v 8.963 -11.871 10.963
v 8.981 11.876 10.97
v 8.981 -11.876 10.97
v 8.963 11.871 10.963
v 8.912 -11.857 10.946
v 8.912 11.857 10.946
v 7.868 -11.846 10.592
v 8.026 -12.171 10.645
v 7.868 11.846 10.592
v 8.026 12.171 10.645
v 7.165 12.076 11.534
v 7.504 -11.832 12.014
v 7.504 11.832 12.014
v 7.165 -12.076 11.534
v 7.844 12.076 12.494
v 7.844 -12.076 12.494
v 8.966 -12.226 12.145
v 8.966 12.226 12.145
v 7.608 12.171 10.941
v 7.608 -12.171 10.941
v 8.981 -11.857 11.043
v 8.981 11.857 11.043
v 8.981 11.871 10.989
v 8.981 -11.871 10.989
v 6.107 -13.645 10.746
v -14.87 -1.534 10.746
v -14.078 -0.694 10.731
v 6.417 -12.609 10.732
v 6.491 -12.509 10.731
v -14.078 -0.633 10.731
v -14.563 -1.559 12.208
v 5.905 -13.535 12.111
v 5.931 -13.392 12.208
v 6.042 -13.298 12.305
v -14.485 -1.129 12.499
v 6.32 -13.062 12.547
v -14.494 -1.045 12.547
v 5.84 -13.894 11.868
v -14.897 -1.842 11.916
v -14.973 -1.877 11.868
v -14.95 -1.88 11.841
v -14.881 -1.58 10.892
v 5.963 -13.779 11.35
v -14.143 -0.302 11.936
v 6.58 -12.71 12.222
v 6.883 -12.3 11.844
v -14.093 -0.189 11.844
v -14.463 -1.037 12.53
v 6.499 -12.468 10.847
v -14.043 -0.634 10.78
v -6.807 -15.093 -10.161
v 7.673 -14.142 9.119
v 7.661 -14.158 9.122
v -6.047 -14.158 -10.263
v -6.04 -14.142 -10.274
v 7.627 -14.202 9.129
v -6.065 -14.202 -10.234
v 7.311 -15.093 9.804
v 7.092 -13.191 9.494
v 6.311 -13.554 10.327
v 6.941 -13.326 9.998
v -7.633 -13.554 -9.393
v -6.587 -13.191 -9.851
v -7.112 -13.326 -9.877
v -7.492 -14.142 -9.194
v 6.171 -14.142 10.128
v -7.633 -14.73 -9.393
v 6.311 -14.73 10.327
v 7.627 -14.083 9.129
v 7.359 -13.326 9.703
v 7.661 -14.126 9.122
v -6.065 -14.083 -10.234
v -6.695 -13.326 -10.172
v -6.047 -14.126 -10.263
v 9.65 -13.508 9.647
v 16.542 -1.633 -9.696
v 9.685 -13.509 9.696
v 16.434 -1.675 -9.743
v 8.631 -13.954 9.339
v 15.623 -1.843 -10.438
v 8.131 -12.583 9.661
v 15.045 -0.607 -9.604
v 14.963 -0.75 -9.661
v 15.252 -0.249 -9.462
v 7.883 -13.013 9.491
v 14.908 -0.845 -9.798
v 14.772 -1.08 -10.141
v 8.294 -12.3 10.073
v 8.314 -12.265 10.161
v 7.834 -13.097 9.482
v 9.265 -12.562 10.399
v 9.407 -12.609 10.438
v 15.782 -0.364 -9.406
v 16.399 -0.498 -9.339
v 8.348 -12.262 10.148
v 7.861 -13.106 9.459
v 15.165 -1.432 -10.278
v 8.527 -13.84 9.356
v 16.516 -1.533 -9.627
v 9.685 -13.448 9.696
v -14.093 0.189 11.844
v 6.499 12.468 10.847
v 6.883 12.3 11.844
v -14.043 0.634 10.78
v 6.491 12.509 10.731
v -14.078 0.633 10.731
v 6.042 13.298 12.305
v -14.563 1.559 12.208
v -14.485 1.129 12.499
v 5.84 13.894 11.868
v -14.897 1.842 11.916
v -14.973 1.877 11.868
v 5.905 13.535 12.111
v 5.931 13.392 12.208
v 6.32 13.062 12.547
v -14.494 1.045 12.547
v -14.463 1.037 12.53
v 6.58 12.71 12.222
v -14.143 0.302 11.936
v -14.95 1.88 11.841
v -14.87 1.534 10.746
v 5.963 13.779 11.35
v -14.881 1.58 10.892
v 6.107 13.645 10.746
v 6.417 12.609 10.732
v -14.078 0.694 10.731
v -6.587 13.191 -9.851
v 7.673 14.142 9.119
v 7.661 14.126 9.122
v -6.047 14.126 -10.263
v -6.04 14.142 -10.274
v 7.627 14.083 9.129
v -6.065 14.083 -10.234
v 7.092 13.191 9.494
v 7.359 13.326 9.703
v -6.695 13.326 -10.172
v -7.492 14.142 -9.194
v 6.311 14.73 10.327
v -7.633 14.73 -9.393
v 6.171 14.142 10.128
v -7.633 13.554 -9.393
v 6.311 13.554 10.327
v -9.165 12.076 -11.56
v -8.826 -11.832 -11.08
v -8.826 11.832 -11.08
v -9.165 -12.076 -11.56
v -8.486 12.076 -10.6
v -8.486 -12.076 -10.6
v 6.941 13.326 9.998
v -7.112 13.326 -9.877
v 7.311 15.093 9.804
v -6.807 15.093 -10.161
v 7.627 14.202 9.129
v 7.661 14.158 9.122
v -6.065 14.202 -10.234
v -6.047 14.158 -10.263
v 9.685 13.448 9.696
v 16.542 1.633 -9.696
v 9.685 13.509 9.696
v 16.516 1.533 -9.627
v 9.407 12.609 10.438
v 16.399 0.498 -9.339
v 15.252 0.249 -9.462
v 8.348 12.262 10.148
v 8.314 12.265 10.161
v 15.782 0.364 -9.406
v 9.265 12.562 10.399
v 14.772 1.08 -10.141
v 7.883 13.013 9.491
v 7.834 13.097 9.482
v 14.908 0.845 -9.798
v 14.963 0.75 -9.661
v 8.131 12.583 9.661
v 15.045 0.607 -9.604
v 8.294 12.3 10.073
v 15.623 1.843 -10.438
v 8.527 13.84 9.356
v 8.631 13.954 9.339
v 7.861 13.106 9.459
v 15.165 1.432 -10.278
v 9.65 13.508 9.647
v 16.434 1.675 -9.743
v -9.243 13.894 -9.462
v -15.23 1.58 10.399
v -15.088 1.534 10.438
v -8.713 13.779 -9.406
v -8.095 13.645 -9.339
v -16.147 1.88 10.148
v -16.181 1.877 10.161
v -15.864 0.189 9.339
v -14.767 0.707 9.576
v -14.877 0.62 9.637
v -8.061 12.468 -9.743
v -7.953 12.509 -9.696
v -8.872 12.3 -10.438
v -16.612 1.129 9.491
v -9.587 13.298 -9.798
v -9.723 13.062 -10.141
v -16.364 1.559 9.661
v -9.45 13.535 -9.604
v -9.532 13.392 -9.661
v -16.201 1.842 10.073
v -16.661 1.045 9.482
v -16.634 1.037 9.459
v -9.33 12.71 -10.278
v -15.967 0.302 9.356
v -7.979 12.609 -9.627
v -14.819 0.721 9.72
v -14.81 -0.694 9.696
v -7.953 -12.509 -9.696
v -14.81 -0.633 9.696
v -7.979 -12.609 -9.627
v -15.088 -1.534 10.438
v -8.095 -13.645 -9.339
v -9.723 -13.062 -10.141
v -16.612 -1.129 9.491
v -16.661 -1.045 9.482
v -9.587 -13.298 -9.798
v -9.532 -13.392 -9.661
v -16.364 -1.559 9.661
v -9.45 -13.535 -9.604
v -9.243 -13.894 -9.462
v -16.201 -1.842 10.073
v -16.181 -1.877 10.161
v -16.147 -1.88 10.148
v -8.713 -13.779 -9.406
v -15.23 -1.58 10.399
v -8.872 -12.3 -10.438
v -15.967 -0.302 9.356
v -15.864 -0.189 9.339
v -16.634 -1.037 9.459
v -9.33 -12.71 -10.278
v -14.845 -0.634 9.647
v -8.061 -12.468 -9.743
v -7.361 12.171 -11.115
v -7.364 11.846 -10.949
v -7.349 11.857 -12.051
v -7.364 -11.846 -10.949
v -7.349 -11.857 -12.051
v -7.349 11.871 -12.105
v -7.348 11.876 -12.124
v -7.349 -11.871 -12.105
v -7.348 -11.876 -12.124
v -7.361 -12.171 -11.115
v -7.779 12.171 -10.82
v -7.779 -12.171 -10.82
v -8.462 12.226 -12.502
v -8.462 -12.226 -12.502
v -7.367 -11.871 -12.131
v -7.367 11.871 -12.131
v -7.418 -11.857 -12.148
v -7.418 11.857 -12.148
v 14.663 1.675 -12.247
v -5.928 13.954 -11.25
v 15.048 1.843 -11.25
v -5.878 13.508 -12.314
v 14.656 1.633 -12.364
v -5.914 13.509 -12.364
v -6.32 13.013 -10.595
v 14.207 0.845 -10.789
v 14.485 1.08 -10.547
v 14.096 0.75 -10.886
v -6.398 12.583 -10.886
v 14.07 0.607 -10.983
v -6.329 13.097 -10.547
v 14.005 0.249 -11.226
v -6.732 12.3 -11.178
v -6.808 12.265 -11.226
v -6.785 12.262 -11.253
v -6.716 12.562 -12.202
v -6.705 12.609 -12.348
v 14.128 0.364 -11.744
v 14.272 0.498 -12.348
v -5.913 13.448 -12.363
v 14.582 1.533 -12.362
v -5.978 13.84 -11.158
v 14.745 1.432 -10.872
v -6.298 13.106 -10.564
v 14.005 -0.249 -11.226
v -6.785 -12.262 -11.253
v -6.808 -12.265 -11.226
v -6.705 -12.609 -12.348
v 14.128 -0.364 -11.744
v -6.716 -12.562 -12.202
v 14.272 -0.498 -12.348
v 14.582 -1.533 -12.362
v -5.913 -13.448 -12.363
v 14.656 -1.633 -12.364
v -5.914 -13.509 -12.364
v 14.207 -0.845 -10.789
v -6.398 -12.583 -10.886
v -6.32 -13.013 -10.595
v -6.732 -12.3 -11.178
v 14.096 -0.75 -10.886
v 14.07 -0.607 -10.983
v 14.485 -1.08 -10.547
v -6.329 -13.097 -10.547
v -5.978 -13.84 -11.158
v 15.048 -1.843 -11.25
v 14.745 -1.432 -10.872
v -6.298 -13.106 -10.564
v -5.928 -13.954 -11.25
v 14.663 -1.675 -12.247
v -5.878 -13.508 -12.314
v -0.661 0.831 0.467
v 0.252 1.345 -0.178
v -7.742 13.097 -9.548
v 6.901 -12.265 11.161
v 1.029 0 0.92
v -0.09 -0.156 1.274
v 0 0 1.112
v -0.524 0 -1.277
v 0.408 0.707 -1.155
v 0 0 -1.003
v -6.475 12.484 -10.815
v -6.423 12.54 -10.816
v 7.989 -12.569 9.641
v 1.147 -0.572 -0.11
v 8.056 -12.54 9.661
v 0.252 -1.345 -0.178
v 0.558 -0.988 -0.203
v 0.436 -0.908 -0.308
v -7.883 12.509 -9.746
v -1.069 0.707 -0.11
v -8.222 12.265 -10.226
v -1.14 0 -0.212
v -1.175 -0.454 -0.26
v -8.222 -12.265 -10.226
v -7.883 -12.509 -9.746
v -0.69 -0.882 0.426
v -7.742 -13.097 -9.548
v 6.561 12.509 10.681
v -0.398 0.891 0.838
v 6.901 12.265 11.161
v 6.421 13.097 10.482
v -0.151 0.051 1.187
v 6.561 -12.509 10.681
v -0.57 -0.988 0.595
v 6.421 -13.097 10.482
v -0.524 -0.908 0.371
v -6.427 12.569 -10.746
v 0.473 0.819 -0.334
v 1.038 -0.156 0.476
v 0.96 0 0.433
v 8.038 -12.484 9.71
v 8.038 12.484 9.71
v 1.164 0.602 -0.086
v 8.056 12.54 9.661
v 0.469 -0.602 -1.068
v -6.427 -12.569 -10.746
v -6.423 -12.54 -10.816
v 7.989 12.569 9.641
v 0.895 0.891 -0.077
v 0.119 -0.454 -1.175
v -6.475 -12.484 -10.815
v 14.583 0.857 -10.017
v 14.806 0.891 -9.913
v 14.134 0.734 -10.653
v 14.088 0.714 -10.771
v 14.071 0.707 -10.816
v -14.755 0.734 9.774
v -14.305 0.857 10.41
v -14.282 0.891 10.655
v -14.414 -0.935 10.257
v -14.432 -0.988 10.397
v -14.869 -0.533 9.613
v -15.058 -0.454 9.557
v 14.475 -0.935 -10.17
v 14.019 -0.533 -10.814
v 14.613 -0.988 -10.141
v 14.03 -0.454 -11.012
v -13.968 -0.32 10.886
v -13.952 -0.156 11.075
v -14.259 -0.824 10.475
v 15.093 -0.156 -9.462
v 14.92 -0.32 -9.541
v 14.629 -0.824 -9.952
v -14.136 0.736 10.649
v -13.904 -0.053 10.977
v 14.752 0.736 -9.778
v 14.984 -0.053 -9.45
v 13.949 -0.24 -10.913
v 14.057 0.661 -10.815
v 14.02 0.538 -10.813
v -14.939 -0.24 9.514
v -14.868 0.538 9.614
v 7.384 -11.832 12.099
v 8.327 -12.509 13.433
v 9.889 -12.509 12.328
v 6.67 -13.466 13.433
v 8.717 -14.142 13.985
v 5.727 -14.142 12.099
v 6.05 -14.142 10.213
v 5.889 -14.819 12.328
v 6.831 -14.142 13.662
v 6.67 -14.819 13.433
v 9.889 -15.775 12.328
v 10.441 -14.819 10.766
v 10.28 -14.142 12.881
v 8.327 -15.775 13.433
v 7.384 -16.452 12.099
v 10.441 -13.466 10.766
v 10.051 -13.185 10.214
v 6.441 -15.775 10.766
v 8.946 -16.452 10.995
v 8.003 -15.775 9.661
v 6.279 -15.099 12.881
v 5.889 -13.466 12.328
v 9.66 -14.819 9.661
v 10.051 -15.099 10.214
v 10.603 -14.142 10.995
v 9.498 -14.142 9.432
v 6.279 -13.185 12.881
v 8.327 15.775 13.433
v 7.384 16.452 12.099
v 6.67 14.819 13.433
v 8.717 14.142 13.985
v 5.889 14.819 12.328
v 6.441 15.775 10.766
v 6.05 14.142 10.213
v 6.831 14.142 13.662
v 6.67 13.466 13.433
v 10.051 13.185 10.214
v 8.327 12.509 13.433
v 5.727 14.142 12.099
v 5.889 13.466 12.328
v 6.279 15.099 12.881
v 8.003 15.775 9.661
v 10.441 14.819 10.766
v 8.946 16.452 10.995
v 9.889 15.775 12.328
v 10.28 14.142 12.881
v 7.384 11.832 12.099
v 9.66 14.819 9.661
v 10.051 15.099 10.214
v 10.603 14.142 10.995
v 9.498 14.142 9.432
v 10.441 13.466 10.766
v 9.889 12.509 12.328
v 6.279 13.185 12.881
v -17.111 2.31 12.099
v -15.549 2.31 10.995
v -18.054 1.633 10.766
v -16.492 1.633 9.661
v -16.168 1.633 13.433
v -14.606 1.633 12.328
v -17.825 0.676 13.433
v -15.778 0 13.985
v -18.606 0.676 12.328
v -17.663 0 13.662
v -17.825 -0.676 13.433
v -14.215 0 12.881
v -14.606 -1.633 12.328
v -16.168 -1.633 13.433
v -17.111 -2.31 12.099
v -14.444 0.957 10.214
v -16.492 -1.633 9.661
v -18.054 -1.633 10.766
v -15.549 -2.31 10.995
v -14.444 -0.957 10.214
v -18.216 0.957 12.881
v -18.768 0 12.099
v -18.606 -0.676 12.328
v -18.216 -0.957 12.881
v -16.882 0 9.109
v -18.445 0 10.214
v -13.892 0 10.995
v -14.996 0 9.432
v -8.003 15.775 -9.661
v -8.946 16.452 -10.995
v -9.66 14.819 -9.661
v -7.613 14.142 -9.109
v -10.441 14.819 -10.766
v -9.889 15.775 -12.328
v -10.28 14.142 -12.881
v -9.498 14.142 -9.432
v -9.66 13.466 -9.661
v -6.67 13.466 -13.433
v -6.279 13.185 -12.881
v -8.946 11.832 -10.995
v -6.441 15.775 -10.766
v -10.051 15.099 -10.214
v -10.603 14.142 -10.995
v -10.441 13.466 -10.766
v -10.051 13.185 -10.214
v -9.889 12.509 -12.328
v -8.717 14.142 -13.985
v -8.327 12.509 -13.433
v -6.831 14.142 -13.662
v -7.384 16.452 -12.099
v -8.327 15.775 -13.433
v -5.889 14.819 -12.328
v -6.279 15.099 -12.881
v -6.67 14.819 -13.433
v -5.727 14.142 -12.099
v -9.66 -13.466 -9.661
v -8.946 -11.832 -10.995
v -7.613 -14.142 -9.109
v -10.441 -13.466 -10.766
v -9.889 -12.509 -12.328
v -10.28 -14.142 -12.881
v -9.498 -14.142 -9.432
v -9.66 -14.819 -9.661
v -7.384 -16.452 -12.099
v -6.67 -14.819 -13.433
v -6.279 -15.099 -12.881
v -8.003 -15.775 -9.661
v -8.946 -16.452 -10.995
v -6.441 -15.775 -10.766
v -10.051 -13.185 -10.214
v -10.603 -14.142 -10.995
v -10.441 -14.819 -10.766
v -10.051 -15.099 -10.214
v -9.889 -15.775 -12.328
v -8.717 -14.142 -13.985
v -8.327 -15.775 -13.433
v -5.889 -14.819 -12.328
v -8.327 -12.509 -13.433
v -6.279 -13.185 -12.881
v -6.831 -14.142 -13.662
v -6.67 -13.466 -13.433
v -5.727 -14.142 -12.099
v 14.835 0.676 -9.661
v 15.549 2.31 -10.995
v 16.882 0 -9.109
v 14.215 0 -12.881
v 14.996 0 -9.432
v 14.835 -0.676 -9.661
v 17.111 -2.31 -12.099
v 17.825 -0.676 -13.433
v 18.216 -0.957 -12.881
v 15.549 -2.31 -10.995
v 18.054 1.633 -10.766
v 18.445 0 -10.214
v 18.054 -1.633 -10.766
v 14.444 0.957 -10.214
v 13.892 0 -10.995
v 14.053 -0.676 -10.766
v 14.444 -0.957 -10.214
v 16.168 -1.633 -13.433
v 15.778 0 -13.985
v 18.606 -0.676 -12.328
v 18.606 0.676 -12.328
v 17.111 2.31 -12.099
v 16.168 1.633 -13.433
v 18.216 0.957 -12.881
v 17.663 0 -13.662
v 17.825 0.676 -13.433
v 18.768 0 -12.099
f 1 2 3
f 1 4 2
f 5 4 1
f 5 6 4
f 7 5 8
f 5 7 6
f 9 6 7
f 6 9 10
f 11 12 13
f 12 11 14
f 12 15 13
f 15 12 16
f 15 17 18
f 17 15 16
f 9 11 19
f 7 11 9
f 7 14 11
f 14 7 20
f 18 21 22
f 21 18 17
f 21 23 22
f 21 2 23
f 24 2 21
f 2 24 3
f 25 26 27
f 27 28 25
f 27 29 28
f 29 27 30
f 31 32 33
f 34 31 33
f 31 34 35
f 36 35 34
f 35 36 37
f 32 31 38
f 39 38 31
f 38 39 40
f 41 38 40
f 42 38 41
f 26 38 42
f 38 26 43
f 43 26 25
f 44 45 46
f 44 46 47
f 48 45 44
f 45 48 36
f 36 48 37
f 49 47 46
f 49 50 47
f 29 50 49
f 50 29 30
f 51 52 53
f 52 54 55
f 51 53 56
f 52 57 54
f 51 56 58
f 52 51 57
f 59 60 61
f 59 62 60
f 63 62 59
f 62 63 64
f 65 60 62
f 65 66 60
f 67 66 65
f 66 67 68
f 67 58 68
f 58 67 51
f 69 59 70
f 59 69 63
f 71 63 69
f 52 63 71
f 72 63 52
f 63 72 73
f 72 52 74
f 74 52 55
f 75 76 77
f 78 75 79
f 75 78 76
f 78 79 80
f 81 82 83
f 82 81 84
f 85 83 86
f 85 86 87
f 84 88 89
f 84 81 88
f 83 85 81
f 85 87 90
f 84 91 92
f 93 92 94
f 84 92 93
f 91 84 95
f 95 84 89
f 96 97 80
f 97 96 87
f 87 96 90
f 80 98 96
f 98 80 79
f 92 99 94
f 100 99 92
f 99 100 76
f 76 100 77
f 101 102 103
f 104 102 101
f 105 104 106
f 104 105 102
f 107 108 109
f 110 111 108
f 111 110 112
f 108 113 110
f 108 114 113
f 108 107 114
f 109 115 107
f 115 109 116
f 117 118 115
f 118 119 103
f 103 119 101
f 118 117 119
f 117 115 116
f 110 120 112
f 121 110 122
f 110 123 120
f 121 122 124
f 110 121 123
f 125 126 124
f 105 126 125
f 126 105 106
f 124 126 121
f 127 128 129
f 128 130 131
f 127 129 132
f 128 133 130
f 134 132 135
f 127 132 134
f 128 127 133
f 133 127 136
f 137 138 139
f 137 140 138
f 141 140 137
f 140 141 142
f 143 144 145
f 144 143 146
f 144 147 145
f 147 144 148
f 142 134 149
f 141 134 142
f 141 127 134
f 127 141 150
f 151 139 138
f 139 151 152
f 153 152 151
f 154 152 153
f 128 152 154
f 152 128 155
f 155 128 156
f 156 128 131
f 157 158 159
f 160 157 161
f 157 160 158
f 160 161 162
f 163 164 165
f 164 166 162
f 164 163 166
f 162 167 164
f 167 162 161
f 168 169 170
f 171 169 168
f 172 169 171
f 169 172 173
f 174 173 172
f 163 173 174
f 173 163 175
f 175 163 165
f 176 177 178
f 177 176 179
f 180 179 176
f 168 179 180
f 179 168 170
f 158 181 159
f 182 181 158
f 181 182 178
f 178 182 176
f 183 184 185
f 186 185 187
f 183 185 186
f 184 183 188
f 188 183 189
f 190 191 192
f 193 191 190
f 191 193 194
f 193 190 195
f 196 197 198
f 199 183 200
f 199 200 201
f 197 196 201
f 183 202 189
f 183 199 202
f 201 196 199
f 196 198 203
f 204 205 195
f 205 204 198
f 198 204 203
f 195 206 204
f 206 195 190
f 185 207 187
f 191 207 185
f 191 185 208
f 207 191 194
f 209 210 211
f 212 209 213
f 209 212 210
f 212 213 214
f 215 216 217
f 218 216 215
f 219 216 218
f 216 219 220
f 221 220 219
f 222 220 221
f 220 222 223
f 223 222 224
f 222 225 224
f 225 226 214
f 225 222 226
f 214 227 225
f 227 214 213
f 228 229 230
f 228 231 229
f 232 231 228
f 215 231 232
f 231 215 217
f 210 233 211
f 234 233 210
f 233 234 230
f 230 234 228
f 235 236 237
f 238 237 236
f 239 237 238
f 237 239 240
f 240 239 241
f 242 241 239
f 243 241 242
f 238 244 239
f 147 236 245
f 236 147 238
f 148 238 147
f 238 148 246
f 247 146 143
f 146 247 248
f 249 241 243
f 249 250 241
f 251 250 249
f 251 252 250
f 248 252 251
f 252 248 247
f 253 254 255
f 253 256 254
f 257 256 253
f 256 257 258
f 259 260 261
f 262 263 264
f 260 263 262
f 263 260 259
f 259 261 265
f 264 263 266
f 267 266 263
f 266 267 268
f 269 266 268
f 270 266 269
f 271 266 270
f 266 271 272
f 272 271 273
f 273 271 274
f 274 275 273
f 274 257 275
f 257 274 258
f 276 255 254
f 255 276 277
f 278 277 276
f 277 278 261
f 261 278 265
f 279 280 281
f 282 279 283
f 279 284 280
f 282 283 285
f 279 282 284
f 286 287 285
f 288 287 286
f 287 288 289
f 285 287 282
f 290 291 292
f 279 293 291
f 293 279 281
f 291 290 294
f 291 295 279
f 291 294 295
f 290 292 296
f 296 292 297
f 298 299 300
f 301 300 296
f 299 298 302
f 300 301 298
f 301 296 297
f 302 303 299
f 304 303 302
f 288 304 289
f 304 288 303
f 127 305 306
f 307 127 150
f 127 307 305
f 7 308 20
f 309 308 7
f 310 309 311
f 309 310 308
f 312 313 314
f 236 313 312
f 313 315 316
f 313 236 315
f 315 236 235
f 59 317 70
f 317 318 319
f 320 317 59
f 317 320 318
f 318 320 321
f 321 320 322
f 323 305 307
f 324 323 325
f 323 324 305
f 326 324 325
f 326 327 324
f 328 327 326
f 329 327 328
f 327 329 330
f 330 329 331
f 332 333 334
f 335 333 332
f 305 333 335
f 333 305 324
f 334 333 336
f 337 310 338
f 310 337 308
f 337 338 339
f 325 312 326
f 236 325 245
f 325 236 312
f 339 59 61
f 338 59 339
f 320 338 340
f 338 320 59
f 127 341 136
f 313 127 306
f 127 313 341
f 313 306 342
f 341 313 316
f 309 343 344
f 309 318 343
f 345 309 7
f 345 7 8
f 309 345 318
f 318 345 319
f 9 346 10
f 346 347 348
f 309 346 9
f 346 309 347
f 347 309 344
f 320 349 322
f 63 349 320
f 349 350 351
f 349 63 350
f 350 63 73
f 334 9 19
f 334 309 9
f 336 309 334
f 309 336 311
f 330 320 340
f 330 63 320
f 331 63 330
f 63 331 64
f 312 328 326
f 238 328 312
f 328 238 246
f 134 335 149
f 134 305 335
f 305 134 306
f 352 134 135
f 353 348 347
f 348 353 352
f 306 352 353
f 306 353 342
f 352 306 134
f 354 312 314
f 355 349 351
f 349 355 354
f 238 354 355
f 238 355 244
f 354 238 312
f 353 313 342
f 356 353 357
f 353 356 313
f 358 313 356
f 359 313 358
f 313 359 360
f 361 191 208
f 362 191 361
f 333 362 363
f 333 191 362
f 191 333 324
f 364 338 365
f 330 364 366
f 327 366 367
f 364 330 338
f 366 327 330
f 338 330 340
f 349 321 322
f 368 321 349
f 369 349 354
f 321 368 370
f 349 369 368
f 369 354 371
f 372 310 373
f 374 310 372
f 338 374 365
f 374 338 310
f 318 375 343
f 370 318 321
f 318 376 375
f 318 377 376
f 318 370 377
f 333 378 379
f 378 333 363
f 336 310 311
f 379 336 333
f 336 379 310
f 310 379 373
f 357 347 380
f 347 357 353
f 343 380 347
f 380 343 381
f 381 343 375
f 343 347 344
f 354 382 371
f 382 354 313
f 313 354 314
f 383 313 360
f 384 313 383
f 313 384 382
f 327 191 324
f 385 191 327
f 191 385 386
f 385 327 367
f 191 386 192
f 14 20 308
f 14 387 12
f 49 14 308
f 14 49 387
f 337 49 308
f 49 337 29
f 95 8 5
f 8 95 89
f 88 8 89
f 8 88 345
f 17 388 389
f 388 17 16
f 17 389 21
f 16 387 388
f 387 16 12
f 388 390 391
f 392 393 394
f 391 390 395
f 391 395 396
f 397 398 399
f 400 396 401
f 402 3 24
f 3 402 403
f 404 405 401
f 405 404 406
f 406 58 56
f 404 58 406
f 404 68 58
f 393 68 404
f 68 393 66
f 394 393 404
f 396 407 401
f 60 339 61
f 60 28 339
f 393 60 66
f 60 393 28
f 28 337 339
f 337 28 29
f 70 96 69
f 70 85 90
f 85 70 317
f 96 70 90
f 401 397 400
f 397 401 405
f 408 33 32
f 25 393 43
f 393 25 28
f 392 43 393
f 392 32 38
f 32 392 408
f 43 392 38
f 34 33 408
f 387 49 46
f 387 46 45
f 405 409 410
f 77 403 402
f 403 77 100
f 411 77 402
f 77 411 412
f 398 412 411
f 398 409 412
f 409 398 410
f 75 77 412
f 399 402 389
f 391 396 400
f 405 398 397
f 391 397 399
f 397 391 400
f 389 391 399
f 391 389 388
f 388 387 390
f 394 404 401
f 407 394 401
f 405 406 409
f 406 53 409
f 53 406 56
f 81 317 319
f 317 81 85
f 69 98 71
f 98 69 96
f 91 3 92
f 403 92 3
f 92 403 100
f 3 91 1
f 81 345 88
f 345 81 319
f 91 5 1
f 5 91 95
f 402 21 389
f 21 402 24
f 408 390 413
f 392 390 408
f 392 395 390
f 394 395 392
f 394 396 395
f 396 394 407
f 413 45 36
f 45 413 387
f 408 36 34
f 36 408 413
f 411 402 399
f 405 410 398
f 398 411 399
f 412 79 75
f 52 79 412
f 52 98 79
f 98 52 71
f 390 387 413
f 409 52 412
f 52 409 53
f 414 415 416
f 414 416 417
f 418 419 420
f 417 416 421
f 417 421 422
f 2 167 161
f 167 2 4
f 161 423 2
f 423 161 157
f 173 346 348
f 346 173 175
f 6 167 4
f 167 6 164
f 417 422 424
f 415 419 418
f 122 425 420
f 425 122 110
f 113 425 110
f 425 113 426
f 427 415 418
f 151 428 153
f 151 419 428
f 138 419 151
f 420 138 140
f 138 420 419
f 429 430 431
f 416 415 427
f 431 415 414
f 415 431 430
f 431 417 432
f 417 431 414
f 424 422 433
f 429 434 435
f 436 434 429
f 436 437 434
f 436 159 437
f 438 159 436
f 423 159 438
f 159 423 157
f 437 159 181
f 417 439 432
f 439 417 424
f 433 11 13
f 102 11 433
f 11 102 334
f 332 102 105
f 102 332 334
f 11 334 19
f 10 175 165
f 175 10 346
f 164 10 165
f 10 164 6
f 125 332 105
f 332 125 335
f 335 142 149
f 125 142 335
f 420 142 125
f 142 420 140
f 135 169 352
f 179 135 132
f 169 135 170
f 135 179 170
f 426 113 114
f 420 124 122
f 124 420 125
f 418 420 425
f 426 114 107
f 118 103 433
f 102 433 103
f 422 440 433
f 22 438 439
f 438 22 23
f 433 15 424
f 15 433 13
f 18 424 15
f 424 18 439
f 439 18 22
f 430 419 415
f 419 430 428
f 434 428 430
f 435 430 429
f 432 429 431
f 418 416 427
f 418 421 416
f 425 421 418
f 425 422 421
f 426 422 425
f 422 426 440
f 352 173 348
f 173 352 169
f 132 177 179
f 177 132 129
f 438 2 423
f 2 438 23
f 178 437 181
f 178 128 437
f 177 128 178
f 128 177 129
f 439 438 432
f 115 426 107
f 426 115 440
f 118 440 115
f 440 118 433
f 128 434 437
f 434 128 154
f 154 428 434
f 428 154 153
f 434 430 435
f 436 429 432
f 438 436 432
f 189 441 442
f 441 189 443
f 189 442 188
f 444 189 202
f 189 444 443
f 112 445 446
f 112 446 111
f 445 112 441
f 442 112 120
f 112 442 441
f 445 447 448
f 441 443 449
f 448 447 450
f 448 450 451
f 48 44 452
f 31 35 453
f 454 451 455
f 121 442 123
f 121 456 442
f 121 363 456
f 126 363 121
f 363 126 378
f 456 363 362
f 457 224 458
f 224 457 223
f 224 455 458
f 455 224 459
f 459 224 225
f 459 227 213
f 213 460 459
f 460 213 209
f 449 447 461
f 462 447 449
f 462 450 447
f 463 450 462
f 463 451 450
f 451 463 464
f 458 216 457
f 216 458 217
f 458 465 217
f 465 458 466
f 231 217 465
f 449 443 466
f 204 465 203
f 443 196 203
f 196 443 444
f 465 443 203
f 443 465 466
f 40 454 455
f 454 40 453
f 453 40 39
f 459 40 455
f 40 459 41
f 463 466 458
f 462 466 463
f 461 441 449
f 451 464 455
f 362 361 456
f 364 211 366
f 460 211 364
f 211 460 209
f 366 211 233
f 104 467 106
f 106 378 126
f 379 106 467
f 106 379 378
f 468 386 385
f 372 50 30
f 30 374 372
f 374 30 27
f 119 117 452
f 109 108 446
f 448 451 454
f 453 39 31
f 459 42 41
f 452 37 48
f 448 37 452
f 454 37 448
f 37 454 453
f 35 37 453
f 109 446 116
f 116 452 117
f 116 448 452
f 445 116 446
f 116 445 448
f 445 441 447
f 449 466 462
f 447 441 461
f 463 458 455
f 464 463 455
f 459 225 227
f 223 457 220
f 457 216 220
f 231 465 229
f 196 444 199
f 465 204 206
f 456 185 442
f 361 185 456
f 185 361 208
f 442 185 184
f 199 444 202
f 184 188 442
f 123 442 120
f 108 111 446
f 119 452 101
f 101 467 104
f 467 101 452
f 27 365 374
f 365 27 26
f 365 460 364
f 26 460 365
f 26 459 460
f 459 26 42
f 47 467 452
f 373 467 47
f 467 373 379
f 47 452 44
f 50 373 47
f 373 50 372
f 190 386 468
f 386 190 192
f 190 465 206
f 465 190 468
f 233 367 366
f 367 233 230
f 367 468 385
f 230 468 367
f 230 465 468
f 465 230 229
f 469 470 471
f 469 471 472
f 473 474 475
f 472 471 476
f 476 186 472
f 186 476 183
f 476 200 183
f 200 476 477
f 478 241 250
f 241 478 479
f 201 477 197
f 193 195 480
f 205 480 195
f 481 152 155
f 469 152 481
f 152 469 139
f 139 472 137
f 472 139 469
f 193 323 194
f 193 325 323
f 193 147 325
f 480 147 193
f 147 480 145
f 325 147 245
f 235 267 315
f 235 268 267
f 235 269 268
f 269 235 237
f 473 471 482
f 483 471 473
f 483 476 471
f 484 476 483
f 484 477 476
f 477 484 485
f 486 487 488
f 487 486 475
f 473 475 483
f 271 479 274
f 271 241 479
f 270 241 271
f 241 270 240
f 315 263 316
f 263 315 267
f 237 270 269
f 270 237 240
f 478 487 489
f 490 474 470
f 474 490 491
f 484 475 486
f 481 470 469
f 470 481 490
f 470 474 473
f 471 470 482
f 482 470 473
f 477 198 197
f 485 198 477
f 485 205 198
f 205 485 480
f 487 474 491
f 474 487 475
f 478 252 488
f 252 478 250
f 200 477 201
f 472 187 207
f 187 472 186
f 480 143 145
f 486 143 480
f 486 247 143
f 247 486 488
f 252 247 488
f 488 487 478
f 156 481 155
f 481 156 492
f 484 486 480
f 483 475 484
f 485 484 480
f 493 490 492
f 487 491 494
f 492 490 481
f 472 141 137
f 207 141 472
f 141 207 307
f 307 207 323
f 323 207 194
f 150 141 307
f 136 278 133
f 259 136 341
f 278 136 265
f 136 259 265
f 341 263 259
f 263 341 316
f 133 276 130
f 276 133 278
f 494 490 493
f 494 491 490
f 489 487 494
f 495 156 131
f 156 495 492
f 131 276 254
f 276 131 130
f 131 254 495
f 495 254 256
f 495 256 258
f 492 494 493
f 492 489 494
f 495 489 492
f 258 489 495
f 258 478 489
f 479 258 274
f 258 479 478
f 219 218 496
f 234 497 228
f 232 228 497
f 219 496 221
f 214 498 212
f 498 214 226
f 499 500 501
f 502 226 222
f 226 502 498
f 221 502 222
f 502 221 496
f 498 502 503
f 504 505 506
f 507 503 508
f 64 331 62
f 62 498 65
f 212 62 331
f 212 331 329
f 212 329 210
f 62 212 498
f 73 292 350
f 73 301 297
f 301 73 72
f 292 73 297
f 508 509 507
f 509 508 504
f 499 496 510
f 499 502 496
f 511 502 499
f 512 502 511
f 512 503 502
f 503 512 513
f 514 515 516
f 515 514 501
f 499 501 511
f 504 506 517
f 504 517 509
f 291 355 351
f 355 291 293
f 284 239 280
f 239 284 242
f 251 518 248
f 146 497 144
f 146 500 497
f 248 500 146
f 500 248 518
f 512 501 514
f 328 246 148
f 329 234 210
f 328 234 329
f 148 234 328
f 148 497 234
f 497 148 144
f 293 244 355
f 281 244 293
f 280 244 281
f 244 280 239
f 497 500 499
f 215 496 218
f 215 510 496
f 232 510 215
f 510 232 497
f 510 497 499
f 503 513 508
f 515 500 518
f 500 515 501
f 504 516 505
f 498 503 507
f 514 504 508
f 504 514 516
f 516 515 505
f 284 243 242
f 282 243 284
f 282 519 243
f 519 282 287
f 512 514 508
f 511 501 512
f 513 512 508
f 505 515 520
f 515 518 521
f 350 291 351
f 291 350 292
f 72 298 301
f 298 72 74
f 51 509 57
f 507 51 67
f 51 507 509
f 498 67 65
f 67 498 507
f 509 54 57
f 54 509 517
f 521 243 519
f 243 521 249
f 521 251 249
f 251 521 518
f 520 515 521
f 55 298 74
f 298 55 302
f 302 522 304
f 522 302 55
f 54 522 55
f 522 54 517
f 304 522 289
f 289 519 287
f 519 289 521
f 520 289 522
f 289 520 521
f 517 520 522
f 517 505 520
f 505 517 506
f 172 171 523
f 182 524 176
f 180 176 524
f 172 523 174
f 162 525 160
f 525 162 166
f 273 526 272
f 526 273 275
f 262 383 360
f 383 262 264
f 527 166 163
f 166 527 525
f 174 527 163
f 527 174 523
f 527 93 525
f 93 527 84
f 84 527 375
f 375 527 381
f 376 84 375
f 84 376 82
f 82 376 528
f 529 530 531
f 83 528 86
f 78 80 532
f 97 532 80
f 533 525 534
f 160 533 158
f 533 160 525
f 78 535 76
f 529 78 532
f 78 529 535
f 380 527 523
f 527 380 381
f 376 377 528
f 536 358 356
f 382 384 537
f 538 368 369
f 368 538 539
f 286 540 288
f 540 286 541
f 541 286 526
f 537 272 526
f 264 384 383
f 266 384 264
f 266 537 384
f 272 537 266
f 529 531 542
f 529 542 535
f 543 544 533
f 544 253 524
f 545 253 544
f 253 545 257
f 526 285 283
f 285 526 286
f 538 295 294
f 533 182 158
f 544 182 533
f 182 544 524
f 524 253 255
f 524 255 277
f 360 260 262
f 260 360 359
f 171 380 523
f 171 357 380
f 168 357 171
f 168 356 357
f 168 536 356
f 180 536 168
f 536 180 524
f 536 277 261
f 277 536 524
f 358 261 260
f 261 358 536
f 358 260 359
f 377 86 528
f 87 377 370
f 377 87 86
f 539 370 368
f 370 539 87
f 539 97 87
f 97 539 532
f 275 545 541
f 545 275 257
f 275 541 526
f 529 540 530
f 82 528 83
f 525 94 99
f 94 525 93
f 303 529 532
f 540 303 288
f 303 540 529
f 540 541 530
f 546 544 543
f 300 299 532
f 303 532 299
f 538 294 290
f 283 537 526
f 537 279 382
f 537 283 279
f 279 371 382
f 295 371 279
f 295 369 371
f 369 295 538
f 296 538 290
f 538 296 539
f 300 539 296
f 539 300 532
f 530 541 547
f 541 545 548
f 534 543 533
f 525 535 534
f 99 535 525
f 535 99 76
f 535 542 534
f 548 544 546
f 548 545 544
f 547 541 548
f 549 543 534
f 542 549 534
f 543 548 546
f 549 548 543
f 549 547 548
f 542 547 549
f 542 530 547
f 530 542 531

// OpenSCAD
// polar coordinates for vector v = (x, y, z)
//===========================================================
// distance between points is simply norm(a - b), length is norm(v)
// check if length has given value (within eps)
function lengthIs(v, distance, eps = 0.001) = (abs(norm(v) - distance) < eps);
// angle from the z-axis, in degrees! 
function theta(v) = atan2(norm([v[0], v[1]]), v[2]);
// projected angle in the (x,y)-plane, in degrees! 
function phi(v) = atan2(v[1], v[0]);

// rotating the positive z-axis to a given vector
// orient a given planar object in the (x,y) plane, 
// or an elongated object parallel to the z-axis according to a given vector v 
// a planar object will be perpendicular to v, an elongated object perpendicular
// multiple objects possible
// orient(v) thing1;
// orient(v) {thing1;thing2;}
module orient(v){
    rotate([0, theta(v), phi(v)]) children();
}
// inverse: rotating a given vector to the z-axis
// use for making a plane parallel to the (x,y) plane, the vector is the normal vector
module rotateToZ(v){
    rotate([0, - theta(v), 0]) rotate([0, 0, - phi(v)]) children();
}

// general utilities
//=======================================
// adding the elements of an array by recursion
function addArray(array, i=0, r=0) = (i<len(array)) ? add(array, i+1, r+array[i]) : r;

// an array of points
//==========================================
// scaling an array of points: simply scale * points
// determine distance between two points of an array of points
function distanceOf(points, i = 0, j = 1) = norm(points[i] - points[j]);
// check if distance between two points of an array has given value
function distanceIs(points, i, j, distance, eps = 0.001) = lengthIs(points[i] - points[j], distance, eps);
// select some points from an array, using a second array of indices
function selection(points,indices) = [for(index = indices) points[index]];

// drawing points
//============================
// draw a point at [x,y,z] as a sphere with parameter weight as diameter
module drawPoint(point, weight = 2){
    translate(point) sphere(d = weight);
}
// draw an array of points as spheres of diameter weight
module drawPoints(points, weight = 2){
    for (point = points){
        drawPoint(point, weight);
    }
}
// drawing endpoints of a line 
module drawEndpoints(a, b, weight = 2){
    drawPoint(a, weight);
    drawPoint(b, weight);
}
// drawing a line with a cylinder
// no joints, draw endpoints as spheres in extra step
module drawLine(a, b, weight = 2){
    v = b - a;
    translate(a)
    orient(v) 
    cylinder(h = norm(v), r = weight / 2);
}
// draw lines of a given length between points
module drawLines(points, length, weight = 2, eps = 0.001){
    for (i = [0 : len(points)-2]){
        pointI = points[i];
        for (j = [i + 1 : len(points)-1]){
            pointJ = points[j];
            if (lengthIs(pointI - pointJ,length)){
                drawLine(pointI, pointJ, weight);
            }
        }
    }
}



octagon = [[20,0,0],[0,20,0],[0,0,20],[-20,0,0],[0,-20,0],[0,0,-20]];

rotateToZ([1,1,1]){
drawLines(octagon,distanceOf(octagon));
color("green")drawLines(octagon,40);
color("red")drawPoints(octagon,5);
}
